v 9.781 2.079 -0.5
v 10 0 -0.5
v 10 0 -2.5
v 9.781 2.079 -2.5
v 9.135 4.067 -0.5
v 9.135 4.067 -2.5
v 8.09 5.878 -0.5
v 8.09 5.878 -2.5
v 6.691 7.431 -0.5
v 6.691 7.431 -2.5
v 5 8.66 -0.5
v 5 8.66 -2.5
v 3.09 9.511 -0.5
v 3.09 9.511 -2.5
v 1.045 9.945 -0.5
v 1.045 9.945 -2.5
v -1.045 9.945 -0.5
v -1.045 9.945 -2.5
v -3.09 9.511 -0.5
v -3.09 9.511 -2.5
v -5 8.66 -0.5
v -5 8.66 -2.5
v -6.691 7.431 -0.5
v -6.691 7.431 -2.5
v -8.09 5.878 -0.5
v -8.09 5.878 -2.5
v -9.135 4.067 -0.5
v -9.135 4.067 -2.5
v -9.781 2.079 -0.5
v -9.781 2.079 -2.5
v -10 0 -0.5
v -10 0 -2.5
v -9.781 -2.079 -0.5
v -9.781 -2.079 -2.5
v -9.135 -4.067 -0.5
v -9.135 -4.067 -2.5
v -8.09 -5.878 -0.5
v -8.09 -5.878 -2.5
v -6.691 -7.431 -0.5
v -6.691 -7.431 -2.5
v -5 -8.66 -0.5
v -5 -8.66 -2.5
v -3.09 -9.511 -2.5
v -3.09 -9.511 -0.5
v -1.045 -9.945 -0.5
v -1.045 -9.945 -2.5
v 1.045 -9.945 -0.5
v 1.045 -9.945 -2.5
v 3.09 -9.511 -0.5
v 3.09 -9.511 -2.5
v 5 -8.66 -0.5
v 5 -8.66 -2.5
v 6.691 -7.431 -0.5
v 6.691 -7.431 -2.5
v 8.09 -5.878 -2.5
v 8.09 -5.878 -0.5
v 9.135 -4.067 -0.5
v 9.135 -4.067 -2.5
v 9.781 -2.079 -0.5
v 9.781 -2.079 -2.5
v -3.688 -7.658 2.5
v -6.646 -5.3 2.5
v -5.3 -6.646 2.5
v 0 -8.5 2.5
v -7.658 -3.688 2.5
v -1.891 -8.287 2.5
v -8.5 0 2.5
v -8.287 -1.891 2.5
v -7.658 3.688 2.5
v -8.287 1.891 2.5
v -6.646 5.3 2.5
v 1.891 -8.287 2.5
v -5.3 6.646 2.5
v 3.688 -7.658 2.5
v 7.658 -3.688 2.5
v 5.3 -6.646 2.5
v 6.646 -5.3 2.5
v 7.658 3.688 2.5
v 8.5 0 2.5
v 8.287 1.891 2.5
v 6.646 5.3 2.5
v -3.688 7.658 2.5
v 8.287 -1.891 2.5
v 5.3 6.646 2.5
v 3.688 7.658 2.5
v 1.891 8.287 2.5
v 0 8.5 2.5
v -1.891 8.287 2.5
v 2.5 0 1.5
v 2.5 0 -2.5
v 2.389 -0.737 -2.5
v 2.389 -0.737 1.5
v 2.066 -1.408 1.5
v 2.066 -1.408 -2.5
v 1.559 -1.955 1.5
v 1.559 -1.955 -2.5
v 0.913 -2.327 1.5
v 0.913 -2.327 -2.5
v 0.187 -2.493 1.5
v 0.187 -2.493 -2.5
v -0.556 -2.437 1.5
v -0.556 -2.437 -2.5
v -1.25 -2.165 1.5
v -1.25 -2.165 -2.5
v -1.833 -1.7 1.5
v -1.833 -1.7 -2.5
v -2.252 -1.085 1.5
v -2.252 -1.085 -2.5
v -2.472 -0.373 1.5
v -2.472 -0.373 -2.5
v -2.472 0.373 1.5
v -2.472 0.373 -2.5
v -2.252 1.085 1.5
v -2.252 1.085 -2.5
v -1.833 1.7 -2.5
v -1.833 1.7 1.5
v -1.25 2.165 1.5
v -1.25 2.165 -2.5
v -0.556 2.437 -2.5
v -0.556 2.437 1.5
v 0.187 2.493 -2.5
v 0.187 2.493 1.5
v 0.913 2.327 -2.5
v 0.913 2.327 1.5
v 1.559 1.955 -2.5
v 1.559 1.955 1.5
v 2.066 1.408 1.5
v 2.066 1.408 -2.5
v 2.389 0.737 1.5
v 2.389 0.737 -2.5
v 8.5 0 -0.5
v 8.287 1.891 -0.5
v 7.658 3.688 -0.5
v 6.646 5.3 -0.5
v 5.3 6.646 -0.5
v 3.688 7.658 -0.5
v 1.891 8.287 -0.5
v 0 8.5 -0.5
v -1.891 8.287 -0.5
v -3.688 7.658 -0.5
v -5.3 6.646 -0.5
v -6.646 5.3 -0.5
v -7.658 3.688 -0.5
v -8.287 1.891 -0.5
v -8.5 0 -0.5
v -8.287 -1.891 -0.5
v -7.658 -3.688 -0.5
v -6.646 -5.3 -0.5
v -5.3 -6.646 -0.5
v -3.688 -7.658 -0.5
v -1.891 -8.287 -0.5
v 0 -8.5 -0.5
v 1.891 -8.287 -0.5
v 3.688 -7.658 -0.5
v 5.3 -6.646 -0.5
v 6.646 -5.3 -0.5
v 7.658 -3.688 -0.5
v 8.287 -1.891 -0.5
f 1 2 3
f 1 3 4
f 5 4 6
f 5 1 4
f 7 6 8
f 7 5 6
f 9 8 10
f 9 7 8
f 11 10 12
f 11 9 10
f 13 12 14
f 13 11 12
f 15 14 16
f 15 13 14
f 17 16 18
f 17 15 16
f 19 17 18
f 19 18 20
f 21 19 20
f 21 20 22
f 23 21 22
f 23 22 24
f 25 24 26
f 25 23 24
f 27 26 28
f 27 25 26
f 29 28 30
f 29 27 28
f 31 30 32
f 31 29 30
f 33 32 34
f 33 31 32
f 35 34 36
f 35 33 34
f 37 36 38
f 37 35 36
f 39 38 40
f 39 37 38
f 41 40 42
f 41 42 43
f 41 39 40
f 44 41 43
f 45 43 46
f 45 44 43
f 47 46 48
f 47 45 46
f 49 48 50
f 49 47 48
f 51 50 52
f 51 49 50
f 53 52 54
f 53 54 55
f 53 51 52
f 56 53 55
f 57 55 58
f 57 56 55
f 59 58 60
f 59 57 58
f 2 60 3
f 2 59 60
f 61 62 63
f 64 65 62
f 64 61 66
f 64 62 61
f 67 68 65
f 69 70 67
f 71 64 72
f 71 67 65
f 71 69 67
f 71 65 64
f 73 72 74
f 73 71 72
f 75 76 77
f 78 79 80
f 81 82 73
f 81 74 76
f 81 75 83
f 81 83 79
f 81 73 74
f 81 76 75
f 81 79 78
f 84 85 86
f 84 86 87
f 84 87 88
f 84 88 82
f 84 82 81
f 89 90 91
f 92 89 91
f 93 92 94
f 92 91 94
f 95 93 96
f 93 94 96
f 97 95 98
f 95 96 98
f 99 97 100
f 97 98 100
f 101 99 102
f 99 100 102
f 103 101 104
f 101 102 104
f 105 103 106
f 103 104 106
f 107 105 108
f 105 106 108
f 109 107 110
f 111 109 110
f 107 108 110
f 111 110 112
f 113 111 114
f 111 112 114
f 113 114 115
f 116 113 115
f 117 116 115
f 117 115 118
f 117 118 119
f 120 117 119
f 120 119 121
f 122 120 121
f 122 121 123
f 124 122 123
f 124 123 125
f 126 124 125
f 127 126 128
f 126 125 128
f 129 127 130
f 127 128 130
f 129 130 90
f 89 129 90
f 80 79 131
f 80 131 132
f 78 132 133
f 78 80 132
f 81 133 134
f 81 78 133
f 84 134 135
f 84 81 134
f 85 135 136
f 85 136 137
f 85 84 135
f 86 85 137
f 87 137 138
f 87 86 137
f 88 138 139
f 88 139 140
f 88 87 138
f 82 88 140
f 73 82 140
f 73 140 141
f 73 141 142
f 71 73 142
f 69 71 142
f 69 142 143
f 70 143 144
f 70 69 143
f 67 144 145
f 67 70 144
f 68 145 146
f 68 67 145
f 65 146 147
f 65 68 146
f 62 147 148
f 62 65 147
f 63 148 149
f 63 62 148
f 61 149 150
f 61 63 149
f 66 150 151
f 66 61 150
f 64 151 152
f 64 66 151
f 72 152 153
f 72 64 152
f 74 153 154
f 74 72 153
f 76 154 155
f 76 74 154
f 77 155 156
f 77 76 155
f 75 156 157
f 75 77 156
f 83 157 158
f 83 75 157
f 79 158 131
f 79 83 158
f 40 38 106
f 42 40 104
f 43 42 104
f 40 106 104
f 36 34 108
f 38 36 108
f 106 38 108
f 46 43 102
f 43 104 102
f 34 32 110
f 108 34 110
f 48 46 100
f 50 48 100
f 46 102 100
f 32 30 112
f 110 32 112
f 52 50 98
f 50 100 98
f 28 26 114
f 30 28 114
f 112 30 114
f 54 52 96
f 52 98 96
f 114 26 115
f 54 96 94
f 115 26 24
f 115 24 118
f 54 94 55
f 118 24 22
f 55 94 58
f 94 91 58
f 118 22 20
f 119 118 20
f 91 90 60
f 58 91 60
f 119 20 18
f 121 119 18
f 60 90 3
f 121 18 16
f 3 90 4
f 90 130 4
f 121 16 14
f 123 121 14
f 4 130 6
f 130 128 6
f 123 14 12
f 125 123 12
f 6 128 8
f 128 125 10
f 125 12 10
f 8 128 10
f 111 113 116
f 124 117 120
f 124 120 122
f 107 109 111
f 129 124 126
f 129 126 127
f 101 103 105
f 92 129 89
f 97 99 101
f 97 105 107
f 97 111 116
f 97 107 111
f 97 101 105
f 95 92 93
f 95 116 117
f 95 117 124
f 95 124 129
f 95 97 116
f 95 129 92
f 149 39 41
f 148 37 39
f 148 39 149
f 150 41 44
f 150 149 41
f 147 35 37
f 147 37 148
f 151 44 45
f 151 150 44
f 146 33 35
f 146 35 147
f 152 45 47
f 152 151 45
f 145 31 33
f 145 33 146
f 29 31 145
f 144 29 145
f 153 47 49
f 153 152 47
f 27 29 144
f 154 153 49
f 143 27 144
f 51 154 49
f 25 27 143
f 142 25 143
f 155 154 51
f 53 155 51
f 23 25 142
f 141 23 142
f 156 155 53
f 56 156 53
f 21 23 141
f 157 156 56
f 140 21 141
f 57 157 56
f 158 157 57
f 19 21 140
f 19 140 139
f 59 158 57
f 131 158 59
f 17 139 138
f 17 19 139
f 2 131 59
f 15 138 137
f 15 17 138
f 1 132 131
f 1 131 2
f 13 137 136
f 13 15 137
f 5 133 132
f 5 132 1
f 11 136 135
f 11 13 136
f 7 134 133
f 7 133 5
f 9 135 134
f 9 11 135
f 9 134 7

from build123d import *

# Parameters (mm, degrees)
F0_R     = 10
F1_DEPTH = 2.5
F2_R     = 10
F2_R_2   = 8.5
F3_DEPTH = 3
F4_R     = 2.5
F5_DEPTH = 4


with BuildPart() as f1:
    # F0 (on Top) → F1 (new body, symmetric)
    with BuildSketch(Plane.XY):
        Circle(F0_R)
    extrude(amount=F1_DEPTH, both=True)

    # F2 (on face) → F3 (cut)
    with BuildSketch(Plane.XY.offset(2.5)):
        Circle(F2_R)
        Circle(F2_R_2, mode=Mode.SUBTRACT)
    extrude(amount=-F3_DEPTH, mode=Mode.SUBTRACT)

    # F4 (on face) → F5 (cut)
    with BuildSketch(Plane(origin=(0, 0, -2.5), x_dir=(1, 0, 0), z_dir=(0, 0, -1))):
        Circle(F4_R)
    extrude(amount=-F5_DEPTH, mode=Mode.SUBTRACT)


solid = f1.part
